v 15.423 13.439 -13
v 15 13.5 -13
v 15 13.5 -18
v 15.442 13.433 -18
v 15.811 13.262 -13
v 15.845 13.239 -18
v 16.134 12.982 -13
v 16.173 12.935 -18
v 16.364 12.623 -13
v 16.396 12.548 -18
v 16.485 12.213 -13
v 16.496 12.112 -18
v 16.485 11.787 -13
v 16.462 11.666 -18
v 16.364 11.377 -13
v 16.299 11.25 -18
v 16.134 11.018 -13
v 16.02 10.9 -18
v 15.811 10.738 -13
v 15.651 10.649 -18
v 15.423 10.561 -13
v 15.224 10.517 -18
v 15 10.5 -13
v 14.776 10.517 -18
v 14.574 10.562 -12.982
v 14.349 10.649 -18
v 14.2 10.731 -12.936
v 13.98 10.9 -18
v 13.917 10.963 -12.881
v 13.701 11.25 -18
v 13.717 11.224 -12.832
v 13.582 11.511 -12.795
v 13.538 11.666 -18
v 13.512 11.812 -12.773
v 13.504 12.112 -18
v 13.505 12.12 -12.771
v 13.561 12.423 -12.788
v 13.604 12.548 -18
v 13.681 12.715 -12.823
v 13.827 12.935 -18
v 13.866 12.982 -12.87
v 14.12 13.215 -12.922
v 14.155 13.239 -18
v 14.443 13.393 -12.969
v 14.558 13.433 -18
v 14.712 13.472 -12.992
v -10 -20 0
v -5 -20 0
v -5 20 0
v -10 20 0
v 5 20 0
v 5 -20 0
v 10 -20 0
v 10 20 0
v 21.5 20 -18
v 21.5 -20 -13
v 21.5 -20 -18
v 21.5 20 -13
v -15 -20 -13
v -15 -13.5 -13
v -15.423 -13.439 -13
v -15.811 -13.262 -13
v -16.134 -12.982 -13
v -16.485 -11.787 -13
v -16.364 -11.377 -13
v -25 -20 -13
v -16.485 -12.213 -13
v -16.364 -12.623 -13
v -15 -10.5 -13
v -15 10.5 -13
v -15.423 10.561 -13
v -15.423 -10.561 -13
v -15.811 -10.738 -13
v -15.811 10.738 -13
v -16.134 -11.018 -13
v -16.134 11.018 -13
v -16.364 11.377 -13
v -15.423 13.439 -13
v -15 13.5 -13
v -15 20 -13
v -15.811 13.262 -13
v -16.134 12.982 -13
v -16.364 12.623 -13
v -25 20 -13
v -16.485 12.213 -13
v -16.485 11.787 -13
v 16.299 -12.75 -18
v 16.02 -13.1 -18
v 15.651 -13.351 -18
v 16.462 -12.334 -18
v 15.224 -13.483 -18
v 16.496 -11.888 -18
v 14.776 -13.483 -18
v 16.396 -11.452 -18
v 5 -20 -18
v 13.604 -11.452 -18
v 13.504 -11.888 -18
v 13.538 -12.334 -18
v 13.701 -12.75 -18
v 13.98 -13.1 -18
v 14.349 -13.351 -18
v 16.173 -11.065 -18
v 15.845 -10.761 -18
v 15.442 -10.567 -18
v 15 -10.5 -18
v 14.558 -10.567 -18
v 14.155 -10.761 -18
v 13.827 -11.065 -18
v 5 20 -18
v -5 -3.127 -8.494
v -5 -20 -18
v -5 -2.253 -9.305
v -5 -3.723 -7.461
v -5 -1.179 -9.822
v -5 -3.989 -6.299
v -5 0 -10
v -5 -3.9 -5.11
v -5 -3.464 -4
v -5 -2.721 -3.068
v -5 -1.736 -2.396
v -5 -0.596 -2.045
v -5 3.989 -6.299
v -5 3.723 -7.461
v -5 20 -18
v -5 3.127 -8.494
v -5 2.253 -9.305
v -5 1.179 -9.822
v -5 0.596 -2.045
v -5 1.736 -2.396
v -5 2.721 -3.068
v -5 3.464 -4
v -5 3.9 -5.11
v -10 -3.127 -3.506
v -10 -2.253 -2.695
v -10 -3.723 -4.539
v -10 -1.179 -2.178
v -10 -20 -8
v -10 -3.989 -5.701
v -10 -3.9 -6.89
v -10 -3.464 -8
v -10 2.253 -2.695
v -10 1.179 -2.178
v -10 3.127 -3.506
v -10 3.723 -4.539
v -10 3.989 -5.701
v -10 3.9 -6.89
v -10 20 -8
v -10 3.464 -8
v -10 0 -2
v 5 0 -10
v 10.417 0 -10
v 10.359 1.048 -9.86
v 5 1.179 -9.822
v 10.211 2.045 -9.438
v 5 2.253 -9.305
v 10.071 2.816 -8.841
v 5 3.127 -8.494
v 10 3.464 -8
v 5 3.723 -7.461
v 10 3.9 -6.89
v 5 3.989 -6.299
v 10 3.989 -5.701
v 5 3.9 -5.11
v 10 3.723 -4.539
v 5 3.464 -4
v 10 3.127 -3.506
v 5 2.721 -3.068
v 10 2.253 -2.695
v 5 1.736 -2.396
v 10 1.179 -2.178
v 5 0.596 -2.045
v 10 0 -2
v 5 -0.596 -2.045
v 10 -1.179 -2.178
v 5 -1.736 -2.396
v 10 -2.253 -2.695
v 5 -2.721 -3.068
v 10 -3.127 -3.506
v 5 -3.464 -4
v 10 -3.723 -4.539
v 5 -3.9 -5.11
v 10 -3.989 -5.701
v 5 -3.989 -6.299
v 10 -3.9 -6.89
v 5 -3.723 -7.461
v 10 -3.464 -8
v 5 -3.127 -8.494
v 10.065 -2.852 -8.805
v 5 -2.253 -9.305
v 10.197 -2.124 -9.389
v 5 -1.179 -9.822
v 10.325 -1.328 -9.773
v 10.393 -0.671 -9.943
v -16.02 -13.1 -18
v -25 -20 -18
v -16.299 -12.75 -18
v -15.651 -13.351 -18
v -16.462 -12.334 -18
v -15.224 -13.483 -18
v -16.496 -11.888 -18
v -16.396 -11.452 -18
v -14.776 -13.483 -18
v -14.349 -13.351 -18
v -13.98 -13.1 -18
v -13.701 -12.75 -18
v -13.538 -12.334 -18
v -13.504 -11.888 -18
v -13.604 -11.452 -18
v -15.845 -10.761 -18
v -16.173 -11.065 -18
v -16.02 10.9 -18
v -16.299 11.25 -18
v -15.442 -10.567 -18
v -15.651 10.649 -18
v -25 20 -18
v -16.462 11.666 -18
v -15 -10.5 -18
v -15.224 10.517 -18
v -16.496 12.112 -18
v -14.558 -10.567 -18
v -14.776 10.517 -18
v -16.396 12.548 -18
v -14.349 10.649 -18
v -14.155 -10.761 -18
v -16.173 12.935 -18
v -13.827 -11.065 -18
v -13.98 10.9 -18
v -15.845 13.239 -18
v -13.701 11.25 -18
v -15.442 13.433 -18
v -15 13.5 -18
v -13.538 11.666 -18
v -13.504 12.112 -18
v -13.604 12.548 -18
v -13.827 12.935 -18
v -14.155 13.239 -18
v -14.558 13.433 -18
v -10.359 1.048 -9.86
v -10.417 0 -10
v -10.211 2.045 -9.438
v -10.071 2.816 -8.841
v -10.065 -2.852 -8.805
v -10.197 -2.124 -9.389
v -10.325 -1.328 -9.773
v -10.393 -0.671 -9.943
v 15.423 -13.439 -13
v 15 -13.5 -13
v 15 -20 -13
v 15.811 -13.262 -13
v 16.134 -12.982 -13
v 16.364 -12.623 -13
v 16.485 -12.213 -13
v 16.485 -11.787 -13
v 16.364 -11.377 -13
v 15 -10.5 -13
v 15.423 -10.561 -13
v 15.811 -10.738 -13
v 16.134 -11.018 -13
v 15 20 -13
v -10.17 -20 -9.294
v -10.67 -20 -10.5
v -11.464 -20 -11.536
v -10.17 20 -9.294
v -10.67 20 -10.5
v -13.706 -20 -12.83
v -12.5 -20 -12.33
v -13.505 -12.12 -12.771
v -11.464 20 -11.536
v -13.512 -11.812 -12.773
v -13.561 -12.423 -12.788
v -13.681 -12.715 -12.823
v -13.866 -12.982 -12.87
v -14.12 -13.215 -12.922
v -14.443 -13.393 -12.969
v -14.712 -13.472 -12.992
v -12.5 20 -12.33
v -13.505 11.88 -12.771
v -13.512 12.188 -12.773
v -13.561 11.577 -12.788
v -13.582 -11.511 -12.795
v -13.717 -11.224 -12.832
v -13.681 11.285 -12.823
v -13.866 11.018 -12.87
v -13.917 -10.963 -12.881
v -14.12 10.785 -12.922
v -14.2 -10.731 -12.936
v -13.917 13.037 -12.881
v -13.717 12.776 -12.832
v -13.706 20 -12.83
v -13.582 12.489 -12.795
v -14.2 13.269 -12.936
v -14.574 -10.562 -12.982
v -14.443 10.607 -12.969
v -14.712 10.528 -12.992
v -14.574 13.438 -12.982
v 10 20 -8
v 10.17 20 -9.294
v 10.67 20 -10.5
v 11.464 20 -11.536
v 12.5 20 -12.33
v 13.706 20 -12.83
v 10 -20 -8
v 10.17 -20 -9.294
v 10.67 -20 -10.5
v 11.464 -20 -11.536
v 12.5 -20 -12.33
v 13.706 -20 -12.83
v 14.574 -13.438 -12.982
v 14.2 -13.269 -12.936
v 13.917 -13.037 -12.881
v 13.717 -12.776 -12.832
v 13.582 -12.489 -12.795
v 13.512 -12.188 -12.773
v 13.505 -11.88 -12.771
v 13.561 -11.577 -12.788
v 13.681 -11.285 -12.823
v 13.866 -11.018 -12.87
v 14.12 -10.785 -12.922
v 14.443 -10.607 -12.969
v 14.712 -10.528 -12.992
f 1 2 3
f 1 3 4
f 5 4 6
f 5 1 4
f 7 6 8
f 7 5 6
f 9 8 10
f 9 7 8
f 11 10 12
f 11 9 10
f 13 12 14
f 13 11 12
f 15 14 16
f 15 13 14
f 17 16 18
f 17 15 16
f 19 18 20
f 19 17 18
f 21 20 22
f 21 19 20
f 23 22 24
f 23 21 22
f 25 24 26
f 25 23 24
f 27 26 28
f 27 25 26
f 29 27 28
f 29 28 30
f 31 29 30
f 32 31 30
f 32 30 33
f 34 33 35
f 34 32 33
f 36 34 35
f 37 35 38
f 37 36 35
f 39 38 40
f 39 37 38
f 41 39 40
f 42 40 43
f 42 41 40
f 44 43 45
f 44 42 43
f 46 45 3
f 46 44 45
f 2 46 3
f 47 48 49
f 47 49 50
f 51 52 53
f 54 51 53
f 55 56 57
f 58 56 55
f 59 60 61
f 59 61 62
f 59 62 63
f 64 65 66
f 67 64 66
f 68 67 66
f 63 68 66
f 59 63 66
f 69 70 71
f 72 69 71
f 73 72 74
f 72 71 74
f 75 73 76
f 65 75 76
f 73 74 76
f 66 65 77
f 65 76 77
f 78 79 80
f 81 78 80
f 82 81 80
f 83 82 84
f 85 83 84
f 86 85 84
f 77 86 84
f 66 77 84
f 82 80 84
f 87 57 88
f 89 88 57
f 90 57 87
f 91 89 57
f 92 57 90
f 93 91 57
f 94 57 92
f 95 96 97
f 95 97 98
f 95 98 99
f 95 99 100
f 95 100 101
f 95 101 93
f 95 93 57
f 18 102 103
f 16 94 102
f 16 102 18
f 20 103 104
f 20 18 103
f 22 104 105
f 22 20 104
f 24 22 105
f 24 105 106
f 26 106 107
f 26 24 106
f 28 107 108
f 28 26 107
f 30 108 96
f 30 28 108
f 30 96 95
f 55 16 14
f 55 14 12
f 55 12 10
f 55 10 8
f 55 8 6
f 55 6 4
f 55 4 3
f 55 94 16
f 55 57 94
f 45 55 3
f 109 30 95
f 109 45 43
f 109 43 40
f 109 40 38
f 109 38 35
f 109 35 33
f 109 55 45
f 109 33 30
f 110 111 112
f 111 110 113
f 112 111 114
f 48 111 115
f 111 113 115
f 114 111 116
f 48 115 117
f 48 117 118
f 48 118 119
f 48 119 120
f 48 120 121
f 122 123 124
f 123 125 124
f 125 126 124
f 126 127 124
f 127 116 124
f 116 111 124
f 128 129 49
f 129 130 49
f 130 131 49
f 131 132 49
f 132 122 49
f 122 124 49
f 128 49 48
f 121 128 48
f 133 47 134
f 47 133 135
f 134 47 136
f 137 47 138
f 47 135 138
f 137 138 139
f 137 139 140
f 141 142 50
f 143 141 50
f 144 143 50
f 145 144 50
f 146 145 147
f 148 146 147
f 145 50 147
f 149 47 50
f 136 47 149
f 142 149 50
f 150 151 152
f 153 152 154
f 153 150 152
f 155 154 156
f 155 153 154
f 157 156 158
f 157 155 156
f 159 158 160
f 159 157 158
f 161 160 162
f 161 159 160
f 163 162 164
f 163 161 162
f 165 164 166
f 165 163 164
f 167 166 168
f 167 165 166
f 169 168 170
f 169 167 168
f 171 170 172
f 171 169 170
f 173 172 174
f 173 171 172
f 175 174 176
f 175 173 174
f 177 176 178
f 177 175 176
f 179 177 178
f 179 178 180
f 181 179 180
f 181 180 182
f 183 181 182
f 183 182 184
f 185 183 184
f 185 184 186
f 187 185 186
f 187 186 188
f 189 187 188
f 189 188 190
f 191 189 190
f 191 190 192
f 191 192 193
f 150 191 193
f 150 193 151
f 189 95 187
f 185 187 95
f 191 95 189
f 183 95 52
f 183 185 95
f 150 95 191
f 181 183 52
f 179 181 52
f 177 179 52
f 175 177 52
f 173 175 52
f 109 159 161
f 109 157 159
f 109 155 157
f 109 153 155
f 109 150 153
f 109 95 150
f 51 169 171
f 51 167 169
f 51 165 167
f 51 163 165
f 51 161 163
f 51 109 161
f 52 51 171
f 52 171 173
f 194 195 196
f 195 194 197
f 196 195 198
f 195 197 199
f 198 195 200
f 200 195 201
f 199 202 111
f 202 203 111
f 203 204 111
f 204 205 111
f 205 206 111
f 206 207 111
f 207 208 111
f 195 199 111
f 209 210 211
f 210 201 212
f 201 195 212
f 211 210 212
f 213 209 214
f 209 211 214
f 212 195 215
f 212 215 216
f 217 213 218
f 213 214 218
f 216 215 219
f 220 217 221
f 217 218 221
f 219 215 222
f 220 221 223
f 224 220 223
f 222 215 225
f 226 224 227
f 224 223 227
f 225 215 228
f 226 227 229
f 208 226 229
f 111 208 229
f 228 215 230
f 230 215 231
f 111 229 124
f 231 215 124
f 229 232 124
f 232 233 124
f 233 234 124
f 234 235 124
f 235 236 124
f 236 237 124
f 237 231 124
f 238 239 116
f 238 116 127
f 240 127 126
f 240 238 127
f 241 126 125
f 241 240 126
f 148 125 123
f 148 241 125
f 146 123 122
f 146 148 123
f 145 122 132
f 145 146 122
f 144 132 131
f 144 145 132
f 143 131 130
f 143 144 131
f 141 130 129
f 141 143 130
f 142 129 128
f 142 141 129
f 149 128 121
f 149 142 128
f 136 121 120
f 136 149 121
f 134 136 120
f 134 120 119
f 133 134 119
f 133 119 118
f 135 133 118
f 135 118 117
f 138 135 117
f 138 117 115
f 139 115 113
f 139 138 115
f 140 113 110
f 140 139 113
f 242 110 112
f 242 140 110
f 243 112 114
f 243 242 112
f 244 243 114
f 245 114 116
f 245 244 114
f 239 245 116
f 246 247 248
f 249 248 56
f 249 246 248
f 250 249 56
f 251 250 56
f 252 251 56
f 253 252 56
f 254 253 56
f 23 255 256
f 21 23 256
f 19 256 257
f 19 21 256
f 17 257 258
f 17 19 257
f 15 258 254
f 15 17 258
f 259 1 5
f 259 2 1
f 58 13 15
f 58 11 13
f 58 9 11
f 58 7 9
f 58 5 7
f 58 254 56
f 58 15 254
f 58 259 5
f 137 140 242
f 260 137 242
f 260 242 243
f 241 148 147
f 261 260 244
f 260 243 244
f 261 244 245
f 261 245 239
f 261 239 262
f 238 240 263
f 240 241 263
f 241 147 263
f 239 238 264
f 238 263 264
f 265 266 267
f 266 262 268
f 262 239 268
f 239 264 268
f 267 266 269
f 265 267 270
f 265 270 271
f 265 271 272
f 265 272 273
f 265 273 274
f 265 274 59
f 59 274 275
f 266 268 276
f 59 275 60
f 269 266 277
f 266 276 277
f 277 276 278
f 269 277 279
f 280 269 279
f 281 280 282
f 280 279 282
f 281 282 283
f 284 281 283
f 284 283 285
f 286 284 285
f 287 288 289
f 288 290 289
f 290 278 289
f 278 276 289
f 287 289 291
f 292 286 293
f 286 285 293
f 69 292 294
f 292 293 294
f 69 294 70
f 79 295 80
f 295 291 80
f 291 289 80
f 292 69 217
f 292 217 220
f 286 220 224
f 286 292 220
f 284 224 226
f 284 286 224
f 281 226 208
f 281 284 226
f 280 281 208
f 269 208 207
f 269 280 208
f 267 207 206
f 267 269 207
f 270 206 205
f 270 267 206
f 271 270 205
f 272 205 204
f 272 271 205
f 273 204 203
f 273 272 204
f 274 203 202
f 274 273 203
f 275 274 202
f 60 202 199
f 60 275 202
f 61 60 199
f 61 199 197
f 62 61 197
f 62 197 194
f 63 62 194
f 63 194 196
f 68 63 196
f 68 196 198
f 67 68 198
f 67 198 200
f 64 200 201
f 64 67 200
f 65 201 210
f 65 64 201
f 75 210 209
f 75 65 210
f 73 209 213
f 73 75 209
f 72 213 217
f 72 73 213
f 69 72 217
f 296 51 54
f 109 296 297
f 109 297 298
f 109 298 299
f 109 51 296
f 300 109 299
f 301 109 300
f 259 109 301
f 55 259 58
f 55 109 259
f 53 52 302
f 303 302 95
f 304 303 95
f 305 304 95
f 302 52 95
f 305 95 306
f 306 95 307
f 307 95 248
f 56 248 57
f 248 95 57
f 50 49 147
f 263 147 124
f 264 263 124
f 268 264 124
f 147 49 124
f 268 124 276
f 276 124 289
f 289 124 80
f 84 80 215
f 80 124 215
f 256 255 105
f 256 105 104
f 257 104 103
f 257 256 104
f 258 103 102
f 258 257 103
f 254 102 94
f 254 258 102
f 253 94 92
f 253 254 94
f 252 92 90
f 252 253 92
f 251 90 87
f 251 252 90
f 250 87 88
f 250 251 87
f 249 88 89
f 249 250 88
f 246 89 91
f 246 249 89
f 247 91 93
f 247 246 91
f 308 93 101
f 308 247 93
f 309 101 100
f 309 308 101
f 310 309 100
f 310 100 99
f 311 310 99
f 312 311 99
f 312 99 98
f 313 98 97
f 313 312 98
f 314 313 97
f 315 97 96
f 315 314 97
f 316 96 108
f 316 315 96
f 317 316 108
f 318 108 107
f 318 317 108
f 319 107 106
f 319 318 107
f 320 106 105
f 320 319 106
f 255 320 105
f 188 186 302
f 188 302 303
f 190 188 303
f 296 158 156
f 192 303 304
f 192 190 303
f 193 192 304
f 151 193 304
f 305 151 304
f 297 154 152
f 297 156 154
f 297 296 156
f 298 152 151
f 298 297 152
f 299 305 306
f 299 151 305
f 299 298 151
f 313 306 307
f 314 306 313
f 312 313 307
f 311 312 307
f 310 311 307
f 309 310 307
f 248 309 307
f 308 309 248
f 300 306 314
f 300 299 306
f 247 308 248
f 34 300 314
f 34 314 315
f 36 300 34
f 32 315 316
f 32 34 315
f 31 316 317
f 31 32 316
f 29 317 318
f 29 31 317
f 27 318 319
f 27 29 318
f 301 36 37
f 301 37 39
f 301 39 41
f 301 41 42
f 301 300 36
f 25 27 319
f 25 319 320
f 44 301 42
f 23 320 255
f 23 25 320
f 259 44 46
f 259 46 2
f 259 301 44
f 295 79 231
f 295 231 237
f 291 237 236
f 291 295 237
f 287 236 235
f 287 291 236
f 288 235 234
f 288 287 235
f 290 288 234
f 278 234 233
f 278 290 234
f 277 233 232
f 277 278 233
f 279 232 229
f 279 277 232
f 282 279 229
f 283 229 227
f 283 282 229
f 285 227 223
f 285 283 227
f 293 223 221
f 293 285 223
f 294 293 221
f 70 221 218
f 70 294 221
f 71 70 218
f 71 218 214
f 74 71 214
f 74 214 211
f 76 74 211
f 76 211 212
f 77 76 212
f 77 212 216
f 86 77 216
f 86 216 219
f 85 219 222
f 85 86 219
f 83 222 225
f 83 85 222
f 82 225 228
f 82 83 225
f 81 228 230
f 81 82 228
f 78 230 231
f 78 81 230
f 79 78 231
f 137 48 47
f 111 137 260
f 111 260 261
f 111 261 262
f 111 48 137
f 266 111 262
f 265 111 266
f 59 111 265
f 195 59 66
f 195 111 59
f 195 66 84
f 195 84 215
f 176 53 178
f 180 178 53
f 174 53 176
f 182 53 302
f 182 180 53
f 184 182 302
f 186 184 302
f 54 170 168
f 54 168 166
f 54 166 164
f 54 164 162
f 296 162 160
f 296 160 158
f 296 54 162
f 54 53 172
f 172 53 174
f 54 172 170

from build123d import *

# Parameters (mm, degrees)
BOSS_EXTRUDE1_DEPTH     = 20
BOSS_EXTRUDE1_2_DEPTH   = 20
CUT_EXTRUDE1_DEPTH      = 45.147480109
CUT_EXTRUDE1_DEPTH_BACK = 45.147480109
SKETCH2_R               = 4
CUT_EXTRUDE2_DEPTH      = 37.728735399
CUT_EXTRUDE2_DEPTH_BACK = 37.728735399
SKETCH3_R               = 1.5
CUT_EXTRUDE3_DEPTH      = 37.728735399
CUT_EXTRUDE3_DEPTH_BACK = 37.728735399
SKETCH4_W               = 3.5
SKETCH4_H               = 40


with BuildPart() as part:
    # Sketch1 → Boss-Extrude1 (new, symmetric)
    with BuildSketch(Plane(origin=(0, 0, 0), x_dir=(1, 0, 0), z_dir=(0, 1, 0))):
        with BuildLine():
            Line((-5, 18), (-5, 0))
            Line((-5, 0), (-10, 0))
            Line((-10, 0), (-10, 8))
            ThreePointArc((-10, 8), (-11.464466094, 11.535533906), (-15, 13))
            Line((-15, 13), (-25, 13))
            Line((-25, 13), (-25, 18))
            Line((-25, 18), (-5, 18))
        make_face()
    extrude(amount=BOSS_EXTRUDE1_DEPTH, both=True)


with BuildPart() as body_2:
    # Sketch1 → Boss-Extrude1 2 (new, symmetric)
    with BuildSketch(Plane(origin=(0, 0, 0), x_dir=(1, 0, 0), z_dir=(0, 1, 0))):
        with BuildLine():
            Line((25, 18), (5, 18))
            Line((5, 18), (5, 0))
            Line((5, 0), (10, 0))
            Line((10, 0), (10, 8))
            ThreePointArc((10, 8), (11.464466094, 11.535533906), (15, 13))
            Line((15, 13), (25, 13))
            Line((25, 13), (25, 18))
        make_face()
    extrude(amount=BOSS_EXTRUDE1_2_DEPTH, both=True)


with BuildPart() as cut_extrude1_tool:
    # Sketch2 → Cut-Extrude1 (new, two sides: drawn at the far end of the back side and taken through both)
    with BuildSketch(Plane(origin=(10, 0, 0), x_dir=(0, 0, -1), z_dir=(1, 0, 0)).offset(-CUT_EXTRUDE1_DEPTH_BACK)):
        with Locations((6, 0)):
            Circle(SKETCH2_R)
    extrude(amount=CUT_EXTRUDE1_DEPTH + CUT_EXTRUDE1_DEPTH_BACK)


with BuildPart() as part_1:
    add(part.part)

    # Cut-Extrude1: cut by cut_extrude1_tool
    add(cut_extrude1_tool.part, mode=Mode.SUBTRACT)


with BuildPart() as body_2_1:
    add(body_2.part)

    # Cut-Extrude1: cut by cut_extrude1_tool
    add(cut_extrude1_tool.part, mode=Mode.SUBTRACT)


with BuildPart() as cut_extrude2_tool:
    # Sketch3 → Cut-Extrude2 (new, two sides: drawn at the far end of the back side and taken through both)
    with BuildSketch(Plane(origin=(0, 0, -18), x_dir=(-1, 0, 0), z_dir=(0, 0, -1)).offset(-CUT_EXTRUDE2_DEPTH_BACK)):
        with Locations(Location((-15, -12, 0), (0, 0, 90))):
            Circle(SKETCH3_R)
        with Locations(Location((-15, 12, 0), (0, 0, 90))):
            Circle(SKETCH3_R)
        with Locations(Location((15, 12, 0), (0, 0, 90))):
            Circle(SKETCH3_R)
        with Locations(Location((15, -12, 0), (0, 0, 90))):
            Circle(SKETCH3_R)
    extrude(amount=CUT_EXTRUDE2_DEPTH + CUT_EXTRUDE2_DEPTH_BACK)


with BuildPart() as part_2:
    add(part_1.part)

    # Cut-Extrude2: cut by cut_extrude2_tool
    add(cut_extrude2_tool.part, mode=Mode.SUBTRACT)


with BuildPart() as body_2_2:
    add(body_2_1.part)

    # Cut-Extrude2: cut by cut_extrude2_tool
    add(cut_extrude2_tool.part, mode=Mode.SUBTRACT)

    # Sketch4 → Cut-Extrude3 (cut, two sides: drawn at the far end of the back side and taken through both)
    with BuildSketch(Plane(origin=(0, 0, -18), x_dir=(-1, 0, 0), z_dir=(0, 0, -1)).offset(-CUT_EXTRUDE3_DEPTH_BACK)):
        with Locations((-23.25, 0)):
            Rectangle(SKETCH4_W, SKETCH4_H)
    extrude(amount=CUT_EXTRUDE3_DEPTH + CUT_EXTRUDE3_DEPTH_BACK, mode=Mode.SUBTRACT)


solid = Compound([part_2.part, body_2_2.part])
